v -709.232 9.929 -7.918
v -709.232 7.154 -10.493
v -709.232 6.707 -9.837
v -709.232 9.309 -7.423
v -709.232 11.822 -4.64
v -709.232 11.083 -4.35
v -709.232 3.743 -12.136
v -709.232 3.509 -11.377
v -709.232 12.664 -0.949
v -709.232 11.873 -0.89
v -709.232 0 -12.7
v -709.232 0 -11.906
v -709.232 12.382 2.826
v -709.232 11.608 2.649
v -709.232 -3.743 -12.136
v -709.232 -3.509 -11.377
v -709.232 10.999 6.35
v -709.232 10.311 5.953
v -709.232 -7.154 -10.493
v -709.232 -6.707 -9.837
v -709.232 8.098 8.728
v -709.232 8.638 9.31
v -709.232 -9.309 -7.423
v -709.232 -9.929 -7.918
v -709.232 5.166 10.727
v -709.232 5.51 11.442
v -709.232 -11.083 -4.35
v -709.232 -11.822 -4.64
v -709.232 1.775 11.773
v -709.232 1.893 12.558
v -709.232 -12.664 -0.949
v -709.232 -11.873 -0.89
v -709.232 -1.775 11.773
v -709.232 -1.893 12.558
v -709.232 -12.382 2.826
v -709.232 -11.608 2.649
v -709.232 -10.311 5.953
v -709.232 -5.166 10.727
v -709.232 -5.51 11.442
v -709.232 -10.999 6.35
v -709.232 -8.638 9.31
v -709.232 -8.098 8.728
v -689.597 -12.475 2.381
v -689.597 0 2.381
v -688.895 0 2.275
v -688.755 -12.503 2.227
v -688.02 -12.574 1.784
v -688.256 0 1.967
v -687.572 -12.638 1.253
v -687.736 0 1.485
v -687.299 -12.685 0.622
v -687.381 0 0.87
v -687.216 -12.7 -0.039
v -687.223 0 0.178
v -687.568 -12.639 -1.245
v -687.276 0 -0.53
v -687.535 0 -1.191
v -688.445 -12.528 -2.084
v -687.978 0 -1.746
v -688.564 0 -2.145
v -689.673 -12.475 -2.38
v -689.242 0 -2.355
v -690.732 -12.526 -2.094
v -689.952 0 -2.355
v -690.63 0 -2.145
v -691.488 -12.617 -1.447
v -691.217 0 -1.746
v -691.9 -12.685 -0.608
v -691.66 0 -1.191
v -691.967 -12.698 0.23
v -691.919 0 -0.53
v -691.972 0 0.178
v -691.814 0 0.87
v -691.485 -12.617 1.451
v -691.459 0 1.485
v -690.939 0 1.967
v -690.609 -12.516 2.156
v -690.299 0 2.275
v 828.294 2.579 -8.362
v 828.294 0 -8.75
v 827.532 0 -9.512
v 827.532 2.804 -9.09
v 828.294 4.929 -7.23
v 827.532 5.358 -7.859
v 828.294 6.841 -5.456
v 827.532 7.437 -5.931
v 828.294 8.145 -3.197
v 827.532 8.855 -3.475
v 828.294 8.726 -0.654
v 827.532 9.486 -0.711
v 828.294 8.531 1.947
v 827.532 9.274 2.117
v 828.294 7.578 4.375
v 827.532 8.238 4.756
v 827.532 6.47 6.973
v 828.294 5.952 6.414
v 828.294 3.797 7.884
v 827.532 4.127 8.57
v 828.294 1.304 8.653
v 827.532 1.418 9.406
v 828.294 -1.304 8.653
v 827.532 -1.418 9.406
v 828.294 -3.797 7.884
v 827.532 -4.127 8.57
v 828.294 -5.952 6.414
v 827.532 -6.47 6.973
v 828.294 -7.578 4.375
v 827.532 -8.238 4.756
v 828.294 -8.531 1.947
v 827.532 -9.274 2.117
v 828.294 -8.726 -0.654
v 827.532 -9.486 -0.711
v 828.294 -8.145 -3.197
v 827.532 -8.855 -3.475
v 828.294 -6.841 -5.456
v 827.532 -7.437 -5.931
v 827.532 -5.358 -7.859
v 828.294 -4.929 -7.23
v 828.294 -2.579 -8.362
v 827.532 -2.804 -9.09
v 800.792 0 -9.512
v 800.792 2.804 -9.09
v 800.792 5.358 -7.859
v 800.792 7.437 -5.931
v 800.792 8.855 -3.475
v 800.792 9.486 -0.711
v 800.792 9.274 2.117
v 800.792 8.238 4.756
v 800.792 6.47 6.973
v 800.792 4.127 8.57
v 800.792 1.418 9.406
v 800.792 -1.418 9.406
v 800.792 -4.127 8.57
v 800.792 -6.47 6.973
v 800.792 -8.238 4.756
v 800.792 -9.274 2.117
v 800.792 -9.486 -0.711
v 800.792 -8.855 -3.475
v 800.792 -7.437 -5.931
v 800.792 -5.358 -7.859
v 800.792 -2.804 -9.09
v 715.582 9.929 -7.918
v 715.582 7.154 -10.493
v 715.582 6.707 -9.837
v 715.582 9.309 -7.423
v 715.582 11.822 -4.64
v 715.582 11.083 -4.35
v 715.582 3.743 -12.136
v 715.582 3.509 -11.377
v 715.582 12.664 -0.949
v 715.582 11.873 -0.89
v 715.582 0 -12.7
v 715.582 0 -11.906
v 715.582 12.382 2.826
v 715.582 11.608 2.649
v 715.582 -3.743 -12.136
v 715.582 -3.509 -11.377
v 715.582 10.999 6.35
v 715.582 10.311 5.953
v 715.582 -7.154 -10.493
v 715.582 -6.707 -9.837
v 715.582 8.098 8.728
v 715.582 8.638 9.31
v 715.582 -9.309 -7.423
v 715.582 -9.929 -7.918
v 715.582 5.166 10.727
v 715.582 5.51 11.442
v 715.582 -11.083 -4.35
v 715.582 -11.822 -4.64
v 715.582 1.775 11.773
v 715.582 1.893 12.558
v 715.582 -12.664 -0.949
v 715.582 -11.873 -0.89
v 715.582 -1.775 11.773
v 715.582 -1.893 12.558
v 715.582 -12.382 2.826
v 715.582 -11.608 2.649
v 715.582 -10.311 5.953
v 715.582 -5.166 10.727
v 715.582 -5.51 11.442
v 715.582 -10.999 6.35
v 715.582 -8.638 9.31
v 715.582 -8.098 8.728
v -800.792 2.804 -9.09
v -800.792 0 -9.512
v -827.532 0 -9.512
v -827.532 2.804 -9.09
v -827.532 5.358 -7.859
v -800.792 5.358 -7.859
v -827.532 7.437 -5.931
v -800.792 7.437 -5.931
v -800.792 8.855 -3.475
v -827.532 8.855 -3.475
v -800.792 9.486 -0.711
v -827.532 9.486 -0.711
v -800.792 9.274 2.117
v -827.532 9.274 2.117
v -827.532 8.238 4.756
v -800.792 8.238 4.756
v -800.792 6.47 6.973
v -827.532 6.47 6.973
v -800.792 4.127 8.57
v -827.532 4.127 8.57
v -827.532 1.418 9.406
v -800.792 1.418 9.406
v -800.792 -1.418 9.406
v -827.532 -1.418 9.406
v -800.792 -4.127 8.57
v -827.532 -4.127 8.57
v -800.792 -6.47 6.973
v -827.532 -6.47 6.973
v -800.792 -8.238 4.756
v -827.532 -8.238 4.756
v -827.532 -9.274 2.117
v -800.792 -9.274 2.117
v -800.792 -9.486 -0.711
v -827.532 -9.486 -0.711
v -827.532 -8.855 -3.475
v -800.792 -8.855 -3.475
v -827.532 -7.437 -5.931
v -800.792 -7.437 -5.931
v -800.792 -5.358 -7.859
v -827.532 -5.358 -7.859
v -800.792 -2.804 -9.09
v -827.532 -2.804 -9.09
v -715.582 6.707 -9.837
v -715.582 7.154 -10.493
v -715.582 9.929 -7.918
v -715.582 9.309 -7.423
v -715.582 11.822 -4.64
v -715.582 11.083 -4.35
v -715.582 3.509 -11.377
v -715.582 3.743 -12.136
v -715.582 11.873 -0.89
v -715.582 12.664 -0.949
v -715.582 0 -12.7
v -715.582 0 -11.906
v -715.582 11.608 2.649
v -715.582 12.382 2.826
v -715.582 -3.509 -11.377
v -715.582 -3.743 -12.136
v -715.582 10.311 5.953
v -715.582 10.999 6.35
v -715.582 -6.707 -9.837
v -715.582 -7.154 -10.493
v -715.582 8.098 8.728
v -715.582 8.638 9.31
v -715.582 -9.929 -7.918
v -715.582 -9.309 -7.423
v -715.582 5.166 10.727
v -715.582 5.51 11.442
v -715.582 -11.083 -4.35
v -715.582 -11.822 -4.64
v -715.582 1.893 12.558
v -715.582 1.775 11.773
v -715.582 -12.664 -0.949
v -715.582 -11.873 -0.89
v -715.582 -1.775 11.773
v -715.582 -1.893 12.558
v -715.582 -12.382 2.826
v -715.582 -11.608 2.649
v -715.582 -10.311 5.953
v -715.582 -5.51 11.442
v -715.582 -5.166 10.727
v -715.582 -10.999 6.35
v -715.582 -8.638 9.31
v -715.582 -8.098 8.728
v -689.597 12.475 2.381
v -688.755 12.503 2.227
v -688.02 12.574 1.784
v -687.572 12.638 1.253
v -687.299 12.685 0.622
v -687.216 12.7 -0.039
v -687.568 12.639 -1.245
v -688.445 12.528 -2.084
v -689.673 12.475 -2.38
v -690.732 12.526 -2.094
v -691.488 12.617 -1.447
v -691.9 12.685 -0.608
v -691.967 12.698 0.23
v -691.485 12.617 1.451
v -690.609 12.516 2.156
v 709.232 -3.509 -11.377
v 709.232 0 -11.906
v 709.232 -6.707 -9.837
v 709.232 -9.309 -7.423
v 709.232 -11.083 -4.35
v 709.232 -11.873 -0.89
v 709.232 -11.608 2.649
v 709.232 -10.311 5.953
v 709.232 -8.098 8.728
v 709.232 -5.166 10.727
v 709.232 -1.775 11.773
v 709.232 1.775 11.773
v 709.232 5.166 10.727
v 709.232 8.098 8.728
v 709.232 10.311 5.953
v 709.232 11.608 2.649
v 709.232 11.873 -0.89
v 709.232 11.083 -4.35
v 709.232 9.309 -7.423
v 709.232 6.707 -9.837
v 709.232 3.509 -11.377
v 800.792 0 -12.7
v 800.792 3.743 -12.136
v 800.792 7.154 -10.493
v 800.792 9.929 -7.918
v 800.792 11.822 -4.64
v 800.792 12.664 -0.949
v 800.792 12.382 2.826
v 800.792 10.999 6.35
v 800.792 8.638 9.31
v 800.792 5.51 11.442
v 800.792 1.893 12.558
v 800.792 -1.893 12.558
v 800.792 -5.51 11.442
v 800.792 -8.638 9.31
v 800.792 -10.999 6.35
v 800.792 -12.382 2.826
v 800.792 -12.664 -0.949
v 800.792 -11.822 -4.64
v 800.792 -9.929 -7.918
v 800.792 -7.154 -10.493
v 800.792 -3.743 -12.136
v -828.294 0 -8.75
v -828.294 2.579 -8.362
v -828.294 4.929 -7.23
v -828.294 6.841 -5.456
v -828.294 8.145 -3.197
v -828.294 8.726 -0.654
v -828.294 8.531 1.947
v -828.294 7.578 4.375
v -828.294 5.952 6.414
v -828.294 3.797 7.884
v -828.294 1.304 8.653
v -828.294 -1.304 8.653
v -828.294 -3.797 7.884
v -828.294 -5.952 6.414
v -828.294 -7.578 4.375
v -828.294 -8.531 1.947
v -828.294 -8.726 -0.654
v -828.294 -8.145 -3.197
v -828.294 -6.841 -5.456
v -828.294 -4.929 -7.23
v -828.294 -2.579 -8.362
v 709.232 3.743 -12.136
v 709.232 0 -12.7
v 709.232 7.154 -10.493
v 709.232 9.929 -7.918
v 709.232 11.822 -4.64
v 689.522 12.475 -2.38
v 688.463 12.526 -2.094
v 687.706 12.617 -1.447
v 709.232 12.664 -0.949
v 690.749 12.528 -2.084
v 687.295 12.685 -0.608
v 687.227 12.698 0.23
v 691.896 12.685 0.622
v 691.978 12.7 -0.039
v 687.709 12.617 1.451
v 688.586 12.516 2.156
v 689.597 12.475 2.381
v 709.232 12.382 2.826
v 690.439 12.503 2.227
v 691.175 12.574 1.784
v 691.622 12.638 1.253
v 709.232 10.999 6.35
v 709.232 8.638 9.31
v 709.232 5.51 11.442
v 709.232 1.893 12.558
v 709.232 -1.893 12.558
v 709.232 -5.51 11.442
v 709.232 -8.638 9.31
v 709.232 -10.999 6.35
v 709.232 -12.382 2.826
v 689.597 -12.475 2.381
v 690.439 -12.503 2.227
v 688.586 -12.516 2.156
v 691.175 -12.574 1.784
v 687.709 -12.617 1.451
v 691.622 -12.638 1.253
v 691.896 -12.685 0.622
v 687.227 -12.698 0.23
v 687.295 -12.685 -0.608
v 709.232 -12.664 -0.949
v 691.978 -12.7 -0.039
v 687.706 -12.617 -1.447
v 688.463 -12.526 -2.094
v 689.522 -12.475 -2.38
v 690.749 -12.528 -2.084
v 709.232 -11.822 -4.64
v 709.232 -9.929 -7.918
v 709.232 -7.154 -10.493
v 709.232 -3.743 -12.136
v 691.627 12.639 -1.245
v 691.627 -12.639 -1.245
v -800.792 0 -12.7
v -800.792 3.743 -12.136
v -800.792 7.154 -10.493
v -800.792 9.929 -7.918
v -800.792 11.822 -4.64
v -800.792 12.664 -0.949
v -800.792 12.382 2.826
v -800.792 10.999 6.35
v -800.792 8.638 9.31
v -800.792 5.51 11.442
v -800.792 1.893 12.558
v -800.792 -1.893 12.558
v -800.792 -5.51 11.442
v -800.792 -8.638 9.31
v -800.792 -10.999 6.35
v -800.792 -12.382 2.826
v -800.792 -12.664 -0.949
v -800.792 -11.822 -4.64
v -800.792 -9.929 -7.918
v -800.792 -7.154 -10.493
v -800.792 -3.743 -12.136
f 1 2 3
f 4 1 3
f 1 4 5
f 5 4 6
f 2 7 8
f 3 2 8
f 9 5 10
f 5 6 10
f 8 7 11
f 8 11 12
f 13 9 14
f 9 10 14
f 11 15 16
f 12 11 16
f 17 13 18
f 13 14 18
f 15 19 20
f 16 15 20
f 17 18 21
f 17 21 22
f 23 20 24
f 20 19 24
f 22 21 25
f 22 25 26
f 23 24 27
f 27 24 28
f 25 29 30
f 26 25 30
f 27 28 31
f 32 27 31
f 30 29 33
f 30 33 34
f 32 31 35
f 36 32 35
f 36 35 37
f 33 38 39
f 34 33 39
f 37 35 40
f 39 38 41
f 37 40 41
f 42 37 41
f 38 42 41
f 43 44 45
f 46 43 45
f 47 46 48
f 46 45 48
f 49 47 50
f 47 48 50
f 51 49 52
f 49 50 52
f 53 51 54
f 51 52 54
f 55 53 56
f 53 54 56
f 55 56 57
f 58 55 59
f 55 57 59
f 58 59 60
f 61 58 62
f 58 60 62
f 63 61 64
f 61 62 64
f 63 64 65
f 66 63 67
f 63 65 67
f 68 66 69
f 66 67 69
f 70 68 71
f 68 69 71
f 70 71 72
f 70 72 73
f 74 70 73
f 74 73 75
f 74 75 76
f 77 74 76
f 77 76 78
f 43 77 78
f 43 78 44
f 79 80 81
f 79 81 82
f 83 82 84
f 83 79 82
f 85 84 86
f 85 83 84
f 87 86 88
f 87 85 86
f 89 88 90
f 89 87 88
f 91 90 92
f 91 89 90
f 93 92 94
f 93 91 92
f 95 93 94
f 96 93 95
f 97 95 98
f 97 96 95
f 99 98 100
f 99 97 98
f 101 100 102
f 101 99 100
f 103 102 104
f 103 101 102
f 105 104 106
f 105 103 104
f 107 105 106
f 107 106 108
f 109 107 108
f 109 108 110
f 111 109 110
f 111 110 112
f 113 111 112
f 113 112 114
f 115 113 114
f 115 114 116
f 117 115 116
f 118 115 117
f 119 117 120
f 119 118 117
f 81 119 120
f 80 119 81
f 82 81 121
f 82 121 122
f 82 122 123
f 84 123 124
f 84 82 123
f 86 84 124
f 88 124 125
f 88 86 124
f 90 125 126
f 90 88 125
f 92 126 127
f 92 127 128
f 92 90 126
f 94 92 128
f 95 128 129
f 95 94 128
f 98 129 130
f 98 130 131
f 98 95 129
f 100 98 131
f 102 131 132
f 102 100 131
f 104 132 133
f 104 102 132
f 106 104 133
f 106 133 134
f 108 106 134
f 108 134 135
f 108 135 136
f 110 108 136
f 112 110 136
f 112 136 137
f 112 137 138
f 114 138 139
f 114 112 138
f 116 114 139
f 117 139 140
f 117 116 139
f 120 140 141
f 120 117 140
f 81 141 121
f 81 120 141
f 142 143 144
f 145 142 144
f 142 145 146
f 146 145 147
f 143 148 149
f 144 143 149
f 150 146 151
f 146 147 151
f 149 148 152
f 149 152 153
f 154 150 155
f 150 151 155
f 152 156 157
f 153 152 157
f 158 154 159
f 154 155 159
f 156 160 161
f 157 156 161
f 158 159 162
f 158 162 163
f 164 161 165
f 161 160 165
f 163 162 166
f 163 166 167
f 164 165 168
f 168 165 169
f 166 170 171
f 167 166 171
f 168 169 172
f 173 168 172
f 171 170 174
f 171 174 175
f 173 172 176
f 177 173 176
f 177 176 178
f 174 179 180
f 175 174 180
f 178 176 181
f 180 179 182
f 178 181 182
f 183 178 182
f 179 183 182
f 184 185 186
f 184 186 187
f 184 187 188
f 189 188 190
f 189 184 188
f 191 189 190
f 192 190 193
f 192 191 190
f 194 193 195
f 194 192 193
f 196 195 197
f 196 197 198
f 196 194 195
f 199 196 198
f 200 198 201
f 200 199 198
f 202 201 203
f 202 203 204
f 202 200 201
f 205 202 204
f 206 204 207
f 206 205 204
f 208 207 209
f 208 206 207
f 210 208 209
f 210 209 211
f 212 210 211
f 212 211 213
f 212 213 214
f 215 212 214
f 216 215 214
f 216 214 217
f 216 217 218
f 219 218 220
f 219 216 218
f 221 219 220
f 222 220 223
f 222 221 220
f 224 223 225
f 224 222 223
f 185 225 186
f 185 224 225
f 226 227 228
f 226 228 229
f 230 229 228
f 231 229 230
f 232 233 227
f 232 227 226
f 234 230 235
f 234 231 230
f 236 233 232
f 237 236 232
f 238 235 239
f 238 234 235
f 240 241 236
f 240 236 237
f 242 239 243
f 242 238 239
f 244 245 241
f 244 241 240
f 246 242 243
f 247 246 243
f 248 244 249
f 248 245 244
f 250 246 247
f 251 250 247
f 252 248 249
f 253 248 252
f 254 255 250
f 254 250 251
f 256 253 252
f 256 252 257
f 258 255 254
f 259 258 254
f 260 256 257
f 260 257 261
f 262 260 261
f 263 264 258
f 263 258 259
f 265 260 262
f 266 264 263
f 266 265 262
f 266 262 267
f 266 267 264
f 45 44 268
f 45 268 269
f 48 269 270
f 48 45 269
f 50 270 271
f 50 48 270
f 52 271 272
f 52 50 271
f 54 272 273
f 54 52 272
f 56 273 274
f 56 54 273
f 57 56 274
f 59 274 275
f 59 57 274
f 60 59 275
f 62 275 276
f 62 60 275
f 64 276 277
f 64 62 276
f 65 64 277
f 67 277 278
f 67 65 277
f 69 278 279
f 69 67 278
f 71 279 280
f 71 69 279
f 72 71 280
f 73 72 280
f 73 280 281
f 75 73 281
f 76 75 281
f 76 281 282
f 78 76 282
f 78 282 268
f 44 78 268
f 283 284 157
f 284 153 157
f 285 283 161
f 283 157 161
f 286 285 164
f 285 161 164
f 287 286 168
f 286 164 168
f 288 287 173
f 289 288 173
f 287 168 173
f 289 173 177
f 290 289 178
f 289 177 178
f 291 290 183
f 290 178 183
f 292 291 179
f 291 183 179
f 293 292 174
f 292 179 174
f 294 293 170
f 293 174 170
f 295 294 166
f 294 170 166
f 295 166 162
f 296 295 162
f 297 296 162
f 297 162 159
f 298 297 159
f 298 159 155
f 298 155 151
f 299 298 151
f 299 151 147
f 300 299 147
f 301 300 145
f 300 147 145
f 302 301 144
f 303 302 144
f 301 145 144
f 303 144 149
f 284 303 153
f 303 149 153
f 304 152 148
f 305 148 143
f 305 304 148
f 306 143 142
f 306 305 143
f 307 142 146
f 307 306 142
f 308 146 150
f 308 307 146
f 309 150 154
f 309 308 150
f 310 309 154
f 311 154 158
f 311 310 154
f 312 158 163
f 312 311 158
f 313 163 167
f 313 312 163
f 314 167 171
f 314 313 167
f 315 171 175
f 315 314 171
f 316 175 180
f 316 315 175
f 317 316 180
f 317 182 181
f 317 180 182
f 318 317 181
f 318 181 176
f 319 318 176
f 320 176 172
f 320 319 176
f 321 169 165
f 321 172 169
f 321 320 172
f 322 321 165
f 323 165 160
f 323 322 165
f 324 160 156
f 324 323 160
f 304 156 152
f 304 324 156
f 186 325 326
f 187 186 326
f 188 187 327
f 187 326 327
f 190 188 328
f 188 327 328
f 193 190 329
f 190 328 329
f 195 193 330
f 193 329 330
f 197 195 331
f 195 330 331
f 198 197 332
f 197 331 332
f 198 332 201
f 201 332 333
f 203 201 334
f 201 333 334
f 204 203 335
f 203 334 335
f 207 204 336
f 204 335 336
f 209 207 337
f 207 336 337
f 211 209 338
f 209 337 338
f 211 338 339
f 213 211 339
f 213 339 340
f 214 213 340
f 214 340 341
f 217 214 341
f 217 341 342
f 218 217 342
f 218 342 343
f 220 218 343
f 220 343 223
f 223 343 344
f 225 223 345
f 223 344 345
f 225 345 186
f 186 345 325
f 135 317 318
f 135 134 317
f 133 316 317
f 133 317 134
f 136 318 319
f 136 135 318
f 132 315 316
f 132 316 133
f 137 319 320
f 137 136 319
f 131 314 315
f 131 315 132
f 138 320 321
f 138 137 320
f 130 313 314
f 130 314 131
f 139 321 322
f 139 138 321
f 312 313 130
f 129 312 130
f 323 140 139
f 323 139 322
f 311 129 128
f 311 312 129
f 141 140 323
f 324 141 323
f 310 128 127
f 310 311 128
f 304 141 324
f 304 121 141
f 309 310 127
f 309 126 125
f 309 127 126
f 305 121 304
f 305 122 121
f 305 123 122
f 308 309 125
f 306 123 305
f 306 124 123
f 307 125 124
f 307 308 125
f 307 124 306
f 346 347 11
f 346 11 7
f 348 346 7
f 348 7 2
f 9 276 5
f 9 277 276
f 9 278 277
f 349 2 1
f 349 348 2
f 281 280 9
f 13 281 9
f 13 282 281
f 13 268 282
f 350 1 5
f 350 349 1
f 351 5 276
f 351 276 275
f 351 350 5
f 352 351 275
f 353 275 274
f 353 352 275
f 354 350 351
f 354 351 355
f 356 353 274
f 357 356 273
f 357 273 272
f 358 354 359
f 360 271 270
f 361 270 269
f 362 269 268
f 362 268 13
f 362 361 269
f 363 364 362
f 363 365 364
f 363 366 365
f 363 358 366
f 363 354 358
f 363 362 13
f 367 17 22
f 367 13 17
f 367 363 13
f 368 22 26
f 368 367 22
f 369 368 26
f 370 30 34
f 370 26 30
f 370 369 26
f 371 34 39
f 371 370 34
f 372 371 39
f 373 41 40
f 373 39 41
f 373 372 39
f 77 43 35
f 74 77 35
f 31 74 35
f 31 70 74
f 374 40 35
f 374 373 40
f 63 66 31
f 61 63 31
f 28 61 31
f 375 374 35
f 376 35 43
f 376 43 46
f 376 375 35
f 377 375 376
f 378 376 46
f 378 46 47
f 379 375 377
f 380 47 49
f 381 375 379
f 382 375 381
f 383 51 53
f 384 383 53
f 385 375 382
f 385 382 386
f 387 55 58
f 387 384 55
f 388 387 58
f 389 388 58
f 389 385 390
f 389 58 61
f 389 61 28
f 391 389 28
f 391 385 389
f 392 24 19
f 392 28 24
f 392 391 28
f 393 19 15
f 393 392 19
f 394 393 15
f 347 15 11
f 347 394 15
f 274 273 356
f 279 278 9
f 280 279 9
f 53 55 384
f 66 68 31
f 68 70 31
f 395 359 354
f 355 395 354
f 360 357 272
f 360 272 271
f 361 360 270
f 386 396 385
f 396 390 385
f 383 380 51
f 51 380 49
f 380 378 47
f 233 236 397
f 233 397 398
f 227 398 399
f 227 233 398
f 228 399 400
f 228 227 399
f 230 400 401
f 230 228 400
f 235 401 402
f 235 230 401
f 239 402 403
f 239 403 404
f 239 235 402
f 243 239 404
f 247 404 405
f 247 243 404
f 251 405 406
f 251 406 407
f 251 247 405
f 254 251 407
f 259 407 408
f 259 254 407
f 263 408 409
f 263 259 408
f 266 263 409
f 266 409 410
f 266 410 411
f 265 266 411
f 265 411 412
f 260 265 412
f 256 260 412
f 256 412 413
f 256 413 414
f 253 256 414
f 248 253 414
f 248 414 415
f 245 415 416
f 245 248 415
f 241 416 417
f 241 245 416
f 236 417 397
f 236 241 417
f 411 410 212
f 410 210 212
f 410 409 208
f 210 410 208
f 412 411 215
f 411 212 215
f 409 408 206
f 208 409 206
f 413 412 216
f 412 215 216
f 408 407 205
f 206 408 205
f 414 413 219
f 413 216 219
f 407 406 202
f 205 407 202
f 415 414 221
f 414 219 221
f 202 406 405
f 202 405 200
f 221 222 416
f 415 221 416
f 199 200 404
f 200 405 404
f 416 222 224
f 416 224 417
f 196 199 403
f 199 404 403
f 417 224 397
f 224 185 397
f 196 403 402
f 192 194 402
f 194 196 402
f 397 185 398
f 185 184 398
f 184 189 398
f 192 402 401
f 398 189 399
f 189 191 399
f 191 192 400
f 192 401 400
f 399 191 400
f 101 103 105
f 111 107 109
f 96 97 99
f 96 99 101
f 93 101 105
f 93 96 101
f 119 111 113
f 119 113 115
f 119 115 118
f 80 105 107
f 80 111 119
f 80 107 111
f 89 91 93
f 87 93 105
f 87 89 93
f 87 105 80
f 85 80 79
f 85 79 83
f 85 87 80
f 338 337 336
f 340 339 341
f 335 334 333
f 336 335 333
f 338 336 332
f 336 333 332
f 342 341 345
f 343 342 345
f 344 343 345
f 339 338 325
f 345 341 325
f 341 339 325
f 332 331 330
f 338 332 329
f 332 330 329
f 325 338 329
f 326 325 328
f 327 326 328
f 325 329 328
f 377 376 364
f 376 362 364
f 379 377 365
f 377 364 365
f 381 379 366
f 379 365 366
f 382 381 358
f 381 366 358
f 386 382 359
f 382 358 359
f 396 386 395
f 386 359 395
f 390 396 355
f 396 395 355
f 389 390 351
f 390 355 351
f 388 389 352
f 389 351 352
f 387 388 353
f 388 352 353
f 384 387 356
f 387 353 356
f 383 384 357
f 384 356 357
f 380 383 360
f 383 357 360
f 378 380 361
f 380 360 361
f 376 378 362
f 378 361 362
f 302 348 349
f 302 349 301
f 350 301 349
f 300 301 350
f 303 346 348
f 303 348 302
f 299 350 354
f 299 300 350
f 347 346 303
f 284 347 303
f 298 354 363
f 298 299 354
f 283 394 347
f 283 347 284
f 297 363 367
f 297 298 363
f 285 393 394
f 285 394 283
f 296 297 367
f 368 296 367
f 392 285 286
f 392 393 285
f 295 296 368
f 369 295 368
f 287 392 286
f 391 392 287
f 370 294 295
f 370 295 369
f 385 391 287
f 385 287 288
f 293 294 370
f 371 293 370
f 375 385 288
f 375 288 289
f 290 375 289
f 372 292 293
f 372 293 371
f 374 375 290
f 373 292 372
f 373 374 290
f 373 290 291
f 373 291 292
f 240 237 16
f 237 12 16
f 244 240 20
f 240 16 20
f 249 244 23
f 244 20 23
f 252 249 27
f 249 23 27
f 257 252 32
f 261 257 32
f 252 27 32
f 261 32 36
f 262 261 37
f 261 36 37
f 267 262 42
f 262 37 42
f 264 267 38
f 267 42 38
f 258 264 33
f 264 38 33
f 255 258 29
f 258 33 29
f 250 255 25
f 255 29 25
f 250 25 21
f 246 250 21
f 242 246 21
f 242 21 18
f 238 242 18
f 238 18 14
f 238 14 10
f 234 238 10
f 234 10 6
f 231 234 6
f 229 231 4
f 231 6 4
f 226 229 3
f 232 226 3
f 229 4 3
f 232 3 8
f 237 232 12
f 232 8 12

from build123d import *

# Parameters (mm, degrees)
SKETCH1_R      = 12.7
EXTRUDE1_DEPTH = 800.79215
SKETCH2_R      = 9.5123
EXTRUDE2_DEPTH = 828.294
SKETCH3_W      = 6.35
SKETCH3_H      = 0.79375
SKETCH4_R      = 2.38125
EXTRUDE3_DEPTH = 19.05
CHAMFER1_SIZE  = 0.762


with BuildPart() as part:
    # Sketch1 → Extrude1 (new, symmetric)
    with BuildSketch(Plane(origin=(0, 0, 0), x_dir=(0, 0, -1), z_dir=(1, 0, 0))):
        Circle(SKETCH1_R)
    extrude(amount=EXTRUDE1_DEPTH, both=True)

    # Sketch2 → Extrude2 (add, symmetric)
    with BuildSketch(Plane(origin=(0, 0, 0), x_dir=(0, 0, -1), z_dir=(1, 0, 0))):
        Circle(SKETCH2_R)
    extrude(amount=EXTRUDE2_DEPTH, both=True)

    # Sketch3 → Cut-Revolve1 (revolve, cut)
    with BuildSketch(Plane.XY):
        with Locations((-712.4065, 12.303125)):
            Rectangle(SKETCH3_W, SKETCH3_H)
        with Locations((712.4065, 12.303125)):
            Rectangle(SKETCH3_W, SKETCH3_H)
    revolve(axis=Axis((800.79215, 0, 0), (-1, 0, 0)), mode=Mode.SUBTRACT)

    # Sketch4 → Extrude3 (cut, symmetric)
    with BuildSketch(Plane(origin=(0, 0, 0), x_dir=(1, 0, 0), z_dir=(0, 1, 0))):
        with Locations((-689.5973, 0)):
            Circle(SKETCH4_R)
        with Locations((689.5973, 0)):
            Circle(SKETCH4_R)
    extrude(amount=EXTRUDE3_DEPTH, both=True, mode=Mode.SUBTRACT)

    # Chamfer1
    chamfer1_edges = [part.edges().sort_by_distance(p)[0] for p in [
        (-828.294, 0, 9.5123),
        (828.294, 0, 9.5123),
    ]]
    chamfer(chamfer1_edges, length=CHAMFER1_SIZE)


solid = part.part
